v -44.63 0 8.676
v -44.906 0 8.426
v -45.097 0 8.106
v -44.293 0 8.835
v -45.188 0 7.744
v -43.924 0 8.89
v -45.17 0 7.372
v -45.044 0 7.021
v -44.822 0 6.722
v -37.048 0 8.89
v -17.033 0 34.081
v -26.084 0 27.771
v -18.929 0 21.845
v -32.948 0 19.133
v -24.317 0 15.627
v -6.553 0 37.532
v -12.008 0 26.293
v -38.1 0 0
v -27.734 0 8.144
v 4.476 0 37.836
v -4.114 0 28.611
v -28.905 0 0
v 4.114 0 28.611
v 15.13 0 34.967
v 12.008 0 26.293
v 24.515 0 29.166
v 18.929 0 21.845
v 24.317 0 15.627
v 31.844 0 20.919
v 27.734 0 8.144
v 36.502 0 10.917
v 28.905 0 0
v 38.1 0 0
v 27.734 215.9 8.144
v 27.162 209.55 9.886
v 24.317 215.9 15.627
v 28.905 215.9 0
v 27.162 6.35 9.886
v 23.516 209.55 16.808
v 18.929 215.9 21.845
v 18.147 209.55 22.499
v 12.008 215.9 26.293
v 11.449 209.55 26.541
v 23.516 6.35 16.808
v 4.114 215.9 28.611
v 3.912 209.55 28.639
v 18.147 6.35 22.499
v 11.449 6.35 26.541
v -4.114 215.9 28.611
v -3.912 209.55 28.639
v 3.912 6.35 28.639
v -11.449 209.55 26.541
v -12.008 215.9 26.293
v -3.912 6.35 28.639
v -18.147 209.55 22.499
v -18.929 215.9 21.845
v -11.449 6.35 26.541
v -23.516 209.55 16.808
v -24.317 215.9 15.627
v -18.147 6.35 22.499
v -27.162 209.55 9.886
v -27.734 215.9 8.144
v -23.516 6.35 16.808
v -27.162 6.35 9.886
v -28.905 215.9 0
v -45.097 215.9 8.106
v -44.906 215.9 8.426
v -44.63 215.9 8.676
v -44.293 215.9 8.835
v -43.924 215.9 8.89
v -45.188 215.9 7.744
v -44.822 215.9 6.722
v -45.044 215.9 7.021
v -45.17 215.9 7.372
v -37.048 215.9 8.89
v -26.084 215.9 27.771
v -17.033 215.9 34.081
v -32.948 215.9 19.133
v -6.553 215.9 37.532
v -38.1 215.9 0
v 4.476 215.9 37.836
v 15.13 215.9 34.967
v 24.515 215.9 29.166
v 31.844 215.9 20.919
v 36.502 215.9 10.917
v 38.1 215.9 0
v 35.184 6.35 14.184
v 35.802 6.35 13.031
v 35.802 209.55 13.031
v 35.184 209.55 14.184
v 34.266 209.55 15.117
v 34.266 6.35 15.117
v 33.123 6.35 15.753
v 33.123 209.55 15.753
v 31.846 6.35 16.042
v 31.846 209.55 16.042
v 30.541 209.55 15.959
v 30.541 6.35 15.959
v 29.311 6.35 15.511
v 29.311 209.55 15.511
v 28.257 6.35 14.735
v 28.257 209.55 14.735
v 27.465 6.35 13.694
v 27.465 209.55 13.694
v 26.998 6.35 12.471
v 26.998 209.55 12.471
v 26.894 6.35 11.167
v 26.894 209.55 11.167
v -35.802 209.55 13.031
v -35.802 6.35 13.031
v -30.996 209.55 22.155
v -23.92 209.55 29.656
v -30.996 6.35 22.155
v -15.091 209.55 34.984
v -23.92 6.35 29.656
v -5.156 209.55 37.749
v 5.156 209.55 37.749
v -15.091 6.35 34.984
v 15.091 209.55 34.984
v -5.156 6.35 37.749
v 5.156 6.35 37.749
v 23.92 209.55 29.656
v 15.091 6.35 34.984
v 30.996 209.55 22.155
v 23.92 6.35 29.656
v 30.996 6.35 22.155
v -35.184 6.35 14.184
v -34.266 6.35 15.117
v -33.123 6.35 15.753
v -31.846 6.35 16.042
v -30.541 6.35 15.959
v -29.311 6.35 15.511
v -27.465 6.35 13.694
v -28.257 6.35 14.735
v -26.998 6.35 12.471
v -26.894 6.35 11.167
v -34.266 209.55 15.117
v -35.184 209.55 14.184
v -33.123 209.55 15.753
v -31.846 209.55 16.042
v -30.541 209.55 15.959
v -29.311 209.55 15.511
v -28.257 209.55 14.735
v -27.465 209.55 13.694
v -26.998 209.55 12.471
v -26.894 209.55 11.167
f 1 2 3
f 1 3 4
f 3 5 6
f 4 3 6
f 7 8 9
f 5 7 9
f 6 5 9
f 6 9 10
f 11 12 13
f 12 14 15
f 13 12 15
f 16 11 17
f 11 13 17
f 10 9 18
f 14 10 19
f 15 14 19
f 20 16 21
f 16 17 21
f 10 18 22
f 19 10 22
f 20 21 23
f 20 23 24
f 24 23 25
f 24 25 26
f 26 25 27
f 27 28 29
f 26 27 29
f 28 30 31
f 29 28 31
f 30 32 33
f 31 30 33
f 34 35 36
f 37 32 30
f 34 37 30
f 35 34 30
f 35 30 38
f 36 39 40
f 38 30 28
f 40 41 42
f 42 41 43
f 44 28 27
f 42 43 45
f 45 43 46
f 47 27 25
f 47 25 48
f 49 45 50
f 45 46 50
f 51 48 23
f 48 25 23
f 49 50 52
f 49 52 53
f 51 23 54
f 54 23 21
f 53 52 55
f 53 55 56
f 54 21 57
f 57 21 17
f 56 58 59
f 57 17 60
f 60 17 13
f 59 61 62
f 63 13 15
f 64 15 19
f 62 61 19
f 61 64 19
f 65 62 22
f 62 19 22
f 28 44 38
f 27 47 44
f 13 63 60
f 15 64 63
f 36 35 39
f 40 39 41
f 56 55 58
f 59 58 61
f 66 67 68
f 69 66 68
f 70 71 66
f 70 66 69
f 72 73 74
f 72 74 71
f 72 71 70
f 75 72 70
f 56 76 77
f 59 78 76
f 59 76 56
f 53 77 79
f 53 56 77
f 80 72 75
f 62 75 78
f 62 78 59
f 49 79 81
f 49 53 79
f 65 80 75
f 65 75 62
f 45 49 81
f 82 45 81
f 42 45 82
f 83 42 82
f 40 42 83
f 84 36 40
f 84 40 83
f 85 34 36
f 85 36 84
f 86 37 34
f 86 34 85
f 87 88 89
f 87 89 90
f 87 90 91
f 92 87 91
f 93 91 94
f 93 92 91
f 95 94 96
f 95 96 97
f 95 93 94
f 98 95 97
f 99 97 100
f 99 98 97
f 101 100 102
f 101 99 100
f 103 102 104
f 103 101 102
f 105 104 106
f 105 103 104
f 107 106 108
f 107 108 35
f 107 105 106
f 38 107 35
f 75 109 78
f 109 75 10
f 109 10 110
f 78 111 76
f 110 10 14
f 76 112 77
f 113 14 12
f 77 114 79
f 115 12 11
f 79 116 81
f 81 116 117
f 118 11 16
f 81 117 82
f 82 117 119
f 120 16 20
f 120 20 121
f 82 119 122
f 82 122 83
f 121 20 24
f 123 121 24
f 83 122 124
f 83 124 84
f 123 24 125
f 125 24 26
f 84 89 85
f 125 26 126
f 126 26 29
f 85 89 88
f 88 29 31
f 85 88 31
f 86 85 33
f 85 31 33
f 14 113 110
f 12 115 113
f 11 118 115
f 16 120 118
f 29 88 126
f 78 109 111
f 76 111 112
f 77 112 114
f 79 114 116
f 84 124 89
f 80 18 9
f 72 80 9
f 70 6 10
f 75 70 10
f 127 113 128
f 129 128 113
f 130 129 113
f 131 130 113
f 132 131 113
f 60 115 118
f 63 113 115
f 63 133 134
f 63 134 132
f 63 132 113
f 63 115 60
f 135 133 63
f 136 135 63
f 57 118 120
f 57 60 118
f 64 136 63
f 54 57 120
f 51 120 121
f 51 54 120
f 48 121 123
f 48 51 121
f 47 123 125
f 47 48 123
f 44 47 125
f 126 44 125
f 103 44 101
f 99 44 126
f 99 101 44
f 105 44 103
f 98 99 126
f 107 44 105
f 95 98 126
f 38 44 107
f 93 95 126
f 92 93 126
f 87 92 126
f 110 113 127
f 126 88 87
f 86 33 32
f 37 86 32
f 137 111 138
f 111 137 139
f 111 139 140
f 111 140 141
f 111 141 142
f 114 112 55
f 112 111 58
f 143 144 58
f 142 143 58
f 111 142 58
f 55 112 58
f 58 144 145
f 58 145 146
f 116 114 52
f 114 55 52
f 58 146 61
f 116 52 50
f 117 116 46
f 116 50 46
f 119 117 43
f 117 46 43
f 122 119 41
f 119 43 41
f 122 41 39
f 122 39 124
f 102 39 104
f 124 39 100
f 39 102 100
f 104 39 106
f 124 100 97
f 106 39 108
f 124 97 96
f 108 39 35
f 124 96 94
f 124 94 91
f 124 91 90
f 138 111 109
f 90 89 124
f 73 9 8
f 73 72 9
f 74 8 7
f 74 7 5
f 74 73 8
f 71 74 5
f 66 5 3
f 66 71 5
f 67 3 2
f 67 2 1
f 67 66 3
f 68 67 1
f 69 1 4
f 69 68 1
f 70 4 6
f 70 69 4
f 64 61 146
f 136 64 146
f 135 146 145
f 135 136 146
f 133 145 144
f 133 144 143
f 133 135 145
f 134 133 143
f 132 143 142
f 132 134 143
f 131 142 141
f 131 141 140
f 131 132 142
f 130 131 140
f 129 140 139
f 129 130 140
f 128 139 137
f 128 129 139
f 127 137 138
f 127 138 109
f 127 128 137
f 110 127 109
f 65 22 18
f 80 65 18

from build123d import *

# Parameters (mm, degrees)
BOSS_EXTRUDE1_DEPTH = 215.9
FILLET2_R           = 1.27
CUT_EXTRUDE2_START  = 6.35
CUT_EXTRUDE2_DEPTH  = 203.2


with BuildPart() as part:
    # Sketch4 → Boss-Extrude1 (new body)
    with BuildSketch(Plane(origin=(0, 0, 0), x_dir=(1, 0, 0), z_dir=(0, 1, 0))):
        with BuildLine():
            Line((-28.9052, 0), (-38.1, 0))
            Line((-38.1, 0), (-46.99, -8.89))
            Line((-46.99, -8.89), (-38.1, -8.89))
            Line((-38.1, -8.89), (-37.04831845, -8.89))
            ThreePointArc((-37.04831845, -8.89), (4.475995255, -37.836166118), (38.1, 0))
            Line((38.1, 0), (28.9052, 0))
            ThreePointArc((28.9052, 0), (0, -28.9052), (-28.9052, 0))
        make_face()
    extrude(amount=BOSS_EXTRUDE1_DEPTH)

    # Fillet2
    fillet2_edges = [part.edges().sort_by_distance(p)[0] for p in [
        (-46.99, 107.95, 8.89),
    ]]
    fillet(fillet2_edges, radius=FILLET2_R)

    # Sketch6 → Cut-Extrude2 (cut)
    with BuildSketch(Plane(origin=(0, 0, 0), x_dir=(1, 0, 0), z_dir=(0, 1, 0)).offset(CUT_EXTRUDE2_START)):
        with BuildLine():
            ThreePointArc((-35.802288852, -13.030967461), (0, -38.1), (35.802288852, -13.030967461))
            ThreePointArc((35.802288852, -13.030967461), (29.90974259, -15.778706909), (27.162003142, -9.886160647))
            ThreePointArc((27.162003142, -9.886160647), (0, -28.9052), (-27.162003142, -9.886160647))
            ThreePointArc((-27.162003142, -9.886160647), (-29.90974259, -15.778706909), (-35.802288852, -13.030967461))
        make_face()
    extrude(amount=CUT_EXTRUDE2_DEPTH, mode=Mode.SUBTRACT)


solid = part.part
